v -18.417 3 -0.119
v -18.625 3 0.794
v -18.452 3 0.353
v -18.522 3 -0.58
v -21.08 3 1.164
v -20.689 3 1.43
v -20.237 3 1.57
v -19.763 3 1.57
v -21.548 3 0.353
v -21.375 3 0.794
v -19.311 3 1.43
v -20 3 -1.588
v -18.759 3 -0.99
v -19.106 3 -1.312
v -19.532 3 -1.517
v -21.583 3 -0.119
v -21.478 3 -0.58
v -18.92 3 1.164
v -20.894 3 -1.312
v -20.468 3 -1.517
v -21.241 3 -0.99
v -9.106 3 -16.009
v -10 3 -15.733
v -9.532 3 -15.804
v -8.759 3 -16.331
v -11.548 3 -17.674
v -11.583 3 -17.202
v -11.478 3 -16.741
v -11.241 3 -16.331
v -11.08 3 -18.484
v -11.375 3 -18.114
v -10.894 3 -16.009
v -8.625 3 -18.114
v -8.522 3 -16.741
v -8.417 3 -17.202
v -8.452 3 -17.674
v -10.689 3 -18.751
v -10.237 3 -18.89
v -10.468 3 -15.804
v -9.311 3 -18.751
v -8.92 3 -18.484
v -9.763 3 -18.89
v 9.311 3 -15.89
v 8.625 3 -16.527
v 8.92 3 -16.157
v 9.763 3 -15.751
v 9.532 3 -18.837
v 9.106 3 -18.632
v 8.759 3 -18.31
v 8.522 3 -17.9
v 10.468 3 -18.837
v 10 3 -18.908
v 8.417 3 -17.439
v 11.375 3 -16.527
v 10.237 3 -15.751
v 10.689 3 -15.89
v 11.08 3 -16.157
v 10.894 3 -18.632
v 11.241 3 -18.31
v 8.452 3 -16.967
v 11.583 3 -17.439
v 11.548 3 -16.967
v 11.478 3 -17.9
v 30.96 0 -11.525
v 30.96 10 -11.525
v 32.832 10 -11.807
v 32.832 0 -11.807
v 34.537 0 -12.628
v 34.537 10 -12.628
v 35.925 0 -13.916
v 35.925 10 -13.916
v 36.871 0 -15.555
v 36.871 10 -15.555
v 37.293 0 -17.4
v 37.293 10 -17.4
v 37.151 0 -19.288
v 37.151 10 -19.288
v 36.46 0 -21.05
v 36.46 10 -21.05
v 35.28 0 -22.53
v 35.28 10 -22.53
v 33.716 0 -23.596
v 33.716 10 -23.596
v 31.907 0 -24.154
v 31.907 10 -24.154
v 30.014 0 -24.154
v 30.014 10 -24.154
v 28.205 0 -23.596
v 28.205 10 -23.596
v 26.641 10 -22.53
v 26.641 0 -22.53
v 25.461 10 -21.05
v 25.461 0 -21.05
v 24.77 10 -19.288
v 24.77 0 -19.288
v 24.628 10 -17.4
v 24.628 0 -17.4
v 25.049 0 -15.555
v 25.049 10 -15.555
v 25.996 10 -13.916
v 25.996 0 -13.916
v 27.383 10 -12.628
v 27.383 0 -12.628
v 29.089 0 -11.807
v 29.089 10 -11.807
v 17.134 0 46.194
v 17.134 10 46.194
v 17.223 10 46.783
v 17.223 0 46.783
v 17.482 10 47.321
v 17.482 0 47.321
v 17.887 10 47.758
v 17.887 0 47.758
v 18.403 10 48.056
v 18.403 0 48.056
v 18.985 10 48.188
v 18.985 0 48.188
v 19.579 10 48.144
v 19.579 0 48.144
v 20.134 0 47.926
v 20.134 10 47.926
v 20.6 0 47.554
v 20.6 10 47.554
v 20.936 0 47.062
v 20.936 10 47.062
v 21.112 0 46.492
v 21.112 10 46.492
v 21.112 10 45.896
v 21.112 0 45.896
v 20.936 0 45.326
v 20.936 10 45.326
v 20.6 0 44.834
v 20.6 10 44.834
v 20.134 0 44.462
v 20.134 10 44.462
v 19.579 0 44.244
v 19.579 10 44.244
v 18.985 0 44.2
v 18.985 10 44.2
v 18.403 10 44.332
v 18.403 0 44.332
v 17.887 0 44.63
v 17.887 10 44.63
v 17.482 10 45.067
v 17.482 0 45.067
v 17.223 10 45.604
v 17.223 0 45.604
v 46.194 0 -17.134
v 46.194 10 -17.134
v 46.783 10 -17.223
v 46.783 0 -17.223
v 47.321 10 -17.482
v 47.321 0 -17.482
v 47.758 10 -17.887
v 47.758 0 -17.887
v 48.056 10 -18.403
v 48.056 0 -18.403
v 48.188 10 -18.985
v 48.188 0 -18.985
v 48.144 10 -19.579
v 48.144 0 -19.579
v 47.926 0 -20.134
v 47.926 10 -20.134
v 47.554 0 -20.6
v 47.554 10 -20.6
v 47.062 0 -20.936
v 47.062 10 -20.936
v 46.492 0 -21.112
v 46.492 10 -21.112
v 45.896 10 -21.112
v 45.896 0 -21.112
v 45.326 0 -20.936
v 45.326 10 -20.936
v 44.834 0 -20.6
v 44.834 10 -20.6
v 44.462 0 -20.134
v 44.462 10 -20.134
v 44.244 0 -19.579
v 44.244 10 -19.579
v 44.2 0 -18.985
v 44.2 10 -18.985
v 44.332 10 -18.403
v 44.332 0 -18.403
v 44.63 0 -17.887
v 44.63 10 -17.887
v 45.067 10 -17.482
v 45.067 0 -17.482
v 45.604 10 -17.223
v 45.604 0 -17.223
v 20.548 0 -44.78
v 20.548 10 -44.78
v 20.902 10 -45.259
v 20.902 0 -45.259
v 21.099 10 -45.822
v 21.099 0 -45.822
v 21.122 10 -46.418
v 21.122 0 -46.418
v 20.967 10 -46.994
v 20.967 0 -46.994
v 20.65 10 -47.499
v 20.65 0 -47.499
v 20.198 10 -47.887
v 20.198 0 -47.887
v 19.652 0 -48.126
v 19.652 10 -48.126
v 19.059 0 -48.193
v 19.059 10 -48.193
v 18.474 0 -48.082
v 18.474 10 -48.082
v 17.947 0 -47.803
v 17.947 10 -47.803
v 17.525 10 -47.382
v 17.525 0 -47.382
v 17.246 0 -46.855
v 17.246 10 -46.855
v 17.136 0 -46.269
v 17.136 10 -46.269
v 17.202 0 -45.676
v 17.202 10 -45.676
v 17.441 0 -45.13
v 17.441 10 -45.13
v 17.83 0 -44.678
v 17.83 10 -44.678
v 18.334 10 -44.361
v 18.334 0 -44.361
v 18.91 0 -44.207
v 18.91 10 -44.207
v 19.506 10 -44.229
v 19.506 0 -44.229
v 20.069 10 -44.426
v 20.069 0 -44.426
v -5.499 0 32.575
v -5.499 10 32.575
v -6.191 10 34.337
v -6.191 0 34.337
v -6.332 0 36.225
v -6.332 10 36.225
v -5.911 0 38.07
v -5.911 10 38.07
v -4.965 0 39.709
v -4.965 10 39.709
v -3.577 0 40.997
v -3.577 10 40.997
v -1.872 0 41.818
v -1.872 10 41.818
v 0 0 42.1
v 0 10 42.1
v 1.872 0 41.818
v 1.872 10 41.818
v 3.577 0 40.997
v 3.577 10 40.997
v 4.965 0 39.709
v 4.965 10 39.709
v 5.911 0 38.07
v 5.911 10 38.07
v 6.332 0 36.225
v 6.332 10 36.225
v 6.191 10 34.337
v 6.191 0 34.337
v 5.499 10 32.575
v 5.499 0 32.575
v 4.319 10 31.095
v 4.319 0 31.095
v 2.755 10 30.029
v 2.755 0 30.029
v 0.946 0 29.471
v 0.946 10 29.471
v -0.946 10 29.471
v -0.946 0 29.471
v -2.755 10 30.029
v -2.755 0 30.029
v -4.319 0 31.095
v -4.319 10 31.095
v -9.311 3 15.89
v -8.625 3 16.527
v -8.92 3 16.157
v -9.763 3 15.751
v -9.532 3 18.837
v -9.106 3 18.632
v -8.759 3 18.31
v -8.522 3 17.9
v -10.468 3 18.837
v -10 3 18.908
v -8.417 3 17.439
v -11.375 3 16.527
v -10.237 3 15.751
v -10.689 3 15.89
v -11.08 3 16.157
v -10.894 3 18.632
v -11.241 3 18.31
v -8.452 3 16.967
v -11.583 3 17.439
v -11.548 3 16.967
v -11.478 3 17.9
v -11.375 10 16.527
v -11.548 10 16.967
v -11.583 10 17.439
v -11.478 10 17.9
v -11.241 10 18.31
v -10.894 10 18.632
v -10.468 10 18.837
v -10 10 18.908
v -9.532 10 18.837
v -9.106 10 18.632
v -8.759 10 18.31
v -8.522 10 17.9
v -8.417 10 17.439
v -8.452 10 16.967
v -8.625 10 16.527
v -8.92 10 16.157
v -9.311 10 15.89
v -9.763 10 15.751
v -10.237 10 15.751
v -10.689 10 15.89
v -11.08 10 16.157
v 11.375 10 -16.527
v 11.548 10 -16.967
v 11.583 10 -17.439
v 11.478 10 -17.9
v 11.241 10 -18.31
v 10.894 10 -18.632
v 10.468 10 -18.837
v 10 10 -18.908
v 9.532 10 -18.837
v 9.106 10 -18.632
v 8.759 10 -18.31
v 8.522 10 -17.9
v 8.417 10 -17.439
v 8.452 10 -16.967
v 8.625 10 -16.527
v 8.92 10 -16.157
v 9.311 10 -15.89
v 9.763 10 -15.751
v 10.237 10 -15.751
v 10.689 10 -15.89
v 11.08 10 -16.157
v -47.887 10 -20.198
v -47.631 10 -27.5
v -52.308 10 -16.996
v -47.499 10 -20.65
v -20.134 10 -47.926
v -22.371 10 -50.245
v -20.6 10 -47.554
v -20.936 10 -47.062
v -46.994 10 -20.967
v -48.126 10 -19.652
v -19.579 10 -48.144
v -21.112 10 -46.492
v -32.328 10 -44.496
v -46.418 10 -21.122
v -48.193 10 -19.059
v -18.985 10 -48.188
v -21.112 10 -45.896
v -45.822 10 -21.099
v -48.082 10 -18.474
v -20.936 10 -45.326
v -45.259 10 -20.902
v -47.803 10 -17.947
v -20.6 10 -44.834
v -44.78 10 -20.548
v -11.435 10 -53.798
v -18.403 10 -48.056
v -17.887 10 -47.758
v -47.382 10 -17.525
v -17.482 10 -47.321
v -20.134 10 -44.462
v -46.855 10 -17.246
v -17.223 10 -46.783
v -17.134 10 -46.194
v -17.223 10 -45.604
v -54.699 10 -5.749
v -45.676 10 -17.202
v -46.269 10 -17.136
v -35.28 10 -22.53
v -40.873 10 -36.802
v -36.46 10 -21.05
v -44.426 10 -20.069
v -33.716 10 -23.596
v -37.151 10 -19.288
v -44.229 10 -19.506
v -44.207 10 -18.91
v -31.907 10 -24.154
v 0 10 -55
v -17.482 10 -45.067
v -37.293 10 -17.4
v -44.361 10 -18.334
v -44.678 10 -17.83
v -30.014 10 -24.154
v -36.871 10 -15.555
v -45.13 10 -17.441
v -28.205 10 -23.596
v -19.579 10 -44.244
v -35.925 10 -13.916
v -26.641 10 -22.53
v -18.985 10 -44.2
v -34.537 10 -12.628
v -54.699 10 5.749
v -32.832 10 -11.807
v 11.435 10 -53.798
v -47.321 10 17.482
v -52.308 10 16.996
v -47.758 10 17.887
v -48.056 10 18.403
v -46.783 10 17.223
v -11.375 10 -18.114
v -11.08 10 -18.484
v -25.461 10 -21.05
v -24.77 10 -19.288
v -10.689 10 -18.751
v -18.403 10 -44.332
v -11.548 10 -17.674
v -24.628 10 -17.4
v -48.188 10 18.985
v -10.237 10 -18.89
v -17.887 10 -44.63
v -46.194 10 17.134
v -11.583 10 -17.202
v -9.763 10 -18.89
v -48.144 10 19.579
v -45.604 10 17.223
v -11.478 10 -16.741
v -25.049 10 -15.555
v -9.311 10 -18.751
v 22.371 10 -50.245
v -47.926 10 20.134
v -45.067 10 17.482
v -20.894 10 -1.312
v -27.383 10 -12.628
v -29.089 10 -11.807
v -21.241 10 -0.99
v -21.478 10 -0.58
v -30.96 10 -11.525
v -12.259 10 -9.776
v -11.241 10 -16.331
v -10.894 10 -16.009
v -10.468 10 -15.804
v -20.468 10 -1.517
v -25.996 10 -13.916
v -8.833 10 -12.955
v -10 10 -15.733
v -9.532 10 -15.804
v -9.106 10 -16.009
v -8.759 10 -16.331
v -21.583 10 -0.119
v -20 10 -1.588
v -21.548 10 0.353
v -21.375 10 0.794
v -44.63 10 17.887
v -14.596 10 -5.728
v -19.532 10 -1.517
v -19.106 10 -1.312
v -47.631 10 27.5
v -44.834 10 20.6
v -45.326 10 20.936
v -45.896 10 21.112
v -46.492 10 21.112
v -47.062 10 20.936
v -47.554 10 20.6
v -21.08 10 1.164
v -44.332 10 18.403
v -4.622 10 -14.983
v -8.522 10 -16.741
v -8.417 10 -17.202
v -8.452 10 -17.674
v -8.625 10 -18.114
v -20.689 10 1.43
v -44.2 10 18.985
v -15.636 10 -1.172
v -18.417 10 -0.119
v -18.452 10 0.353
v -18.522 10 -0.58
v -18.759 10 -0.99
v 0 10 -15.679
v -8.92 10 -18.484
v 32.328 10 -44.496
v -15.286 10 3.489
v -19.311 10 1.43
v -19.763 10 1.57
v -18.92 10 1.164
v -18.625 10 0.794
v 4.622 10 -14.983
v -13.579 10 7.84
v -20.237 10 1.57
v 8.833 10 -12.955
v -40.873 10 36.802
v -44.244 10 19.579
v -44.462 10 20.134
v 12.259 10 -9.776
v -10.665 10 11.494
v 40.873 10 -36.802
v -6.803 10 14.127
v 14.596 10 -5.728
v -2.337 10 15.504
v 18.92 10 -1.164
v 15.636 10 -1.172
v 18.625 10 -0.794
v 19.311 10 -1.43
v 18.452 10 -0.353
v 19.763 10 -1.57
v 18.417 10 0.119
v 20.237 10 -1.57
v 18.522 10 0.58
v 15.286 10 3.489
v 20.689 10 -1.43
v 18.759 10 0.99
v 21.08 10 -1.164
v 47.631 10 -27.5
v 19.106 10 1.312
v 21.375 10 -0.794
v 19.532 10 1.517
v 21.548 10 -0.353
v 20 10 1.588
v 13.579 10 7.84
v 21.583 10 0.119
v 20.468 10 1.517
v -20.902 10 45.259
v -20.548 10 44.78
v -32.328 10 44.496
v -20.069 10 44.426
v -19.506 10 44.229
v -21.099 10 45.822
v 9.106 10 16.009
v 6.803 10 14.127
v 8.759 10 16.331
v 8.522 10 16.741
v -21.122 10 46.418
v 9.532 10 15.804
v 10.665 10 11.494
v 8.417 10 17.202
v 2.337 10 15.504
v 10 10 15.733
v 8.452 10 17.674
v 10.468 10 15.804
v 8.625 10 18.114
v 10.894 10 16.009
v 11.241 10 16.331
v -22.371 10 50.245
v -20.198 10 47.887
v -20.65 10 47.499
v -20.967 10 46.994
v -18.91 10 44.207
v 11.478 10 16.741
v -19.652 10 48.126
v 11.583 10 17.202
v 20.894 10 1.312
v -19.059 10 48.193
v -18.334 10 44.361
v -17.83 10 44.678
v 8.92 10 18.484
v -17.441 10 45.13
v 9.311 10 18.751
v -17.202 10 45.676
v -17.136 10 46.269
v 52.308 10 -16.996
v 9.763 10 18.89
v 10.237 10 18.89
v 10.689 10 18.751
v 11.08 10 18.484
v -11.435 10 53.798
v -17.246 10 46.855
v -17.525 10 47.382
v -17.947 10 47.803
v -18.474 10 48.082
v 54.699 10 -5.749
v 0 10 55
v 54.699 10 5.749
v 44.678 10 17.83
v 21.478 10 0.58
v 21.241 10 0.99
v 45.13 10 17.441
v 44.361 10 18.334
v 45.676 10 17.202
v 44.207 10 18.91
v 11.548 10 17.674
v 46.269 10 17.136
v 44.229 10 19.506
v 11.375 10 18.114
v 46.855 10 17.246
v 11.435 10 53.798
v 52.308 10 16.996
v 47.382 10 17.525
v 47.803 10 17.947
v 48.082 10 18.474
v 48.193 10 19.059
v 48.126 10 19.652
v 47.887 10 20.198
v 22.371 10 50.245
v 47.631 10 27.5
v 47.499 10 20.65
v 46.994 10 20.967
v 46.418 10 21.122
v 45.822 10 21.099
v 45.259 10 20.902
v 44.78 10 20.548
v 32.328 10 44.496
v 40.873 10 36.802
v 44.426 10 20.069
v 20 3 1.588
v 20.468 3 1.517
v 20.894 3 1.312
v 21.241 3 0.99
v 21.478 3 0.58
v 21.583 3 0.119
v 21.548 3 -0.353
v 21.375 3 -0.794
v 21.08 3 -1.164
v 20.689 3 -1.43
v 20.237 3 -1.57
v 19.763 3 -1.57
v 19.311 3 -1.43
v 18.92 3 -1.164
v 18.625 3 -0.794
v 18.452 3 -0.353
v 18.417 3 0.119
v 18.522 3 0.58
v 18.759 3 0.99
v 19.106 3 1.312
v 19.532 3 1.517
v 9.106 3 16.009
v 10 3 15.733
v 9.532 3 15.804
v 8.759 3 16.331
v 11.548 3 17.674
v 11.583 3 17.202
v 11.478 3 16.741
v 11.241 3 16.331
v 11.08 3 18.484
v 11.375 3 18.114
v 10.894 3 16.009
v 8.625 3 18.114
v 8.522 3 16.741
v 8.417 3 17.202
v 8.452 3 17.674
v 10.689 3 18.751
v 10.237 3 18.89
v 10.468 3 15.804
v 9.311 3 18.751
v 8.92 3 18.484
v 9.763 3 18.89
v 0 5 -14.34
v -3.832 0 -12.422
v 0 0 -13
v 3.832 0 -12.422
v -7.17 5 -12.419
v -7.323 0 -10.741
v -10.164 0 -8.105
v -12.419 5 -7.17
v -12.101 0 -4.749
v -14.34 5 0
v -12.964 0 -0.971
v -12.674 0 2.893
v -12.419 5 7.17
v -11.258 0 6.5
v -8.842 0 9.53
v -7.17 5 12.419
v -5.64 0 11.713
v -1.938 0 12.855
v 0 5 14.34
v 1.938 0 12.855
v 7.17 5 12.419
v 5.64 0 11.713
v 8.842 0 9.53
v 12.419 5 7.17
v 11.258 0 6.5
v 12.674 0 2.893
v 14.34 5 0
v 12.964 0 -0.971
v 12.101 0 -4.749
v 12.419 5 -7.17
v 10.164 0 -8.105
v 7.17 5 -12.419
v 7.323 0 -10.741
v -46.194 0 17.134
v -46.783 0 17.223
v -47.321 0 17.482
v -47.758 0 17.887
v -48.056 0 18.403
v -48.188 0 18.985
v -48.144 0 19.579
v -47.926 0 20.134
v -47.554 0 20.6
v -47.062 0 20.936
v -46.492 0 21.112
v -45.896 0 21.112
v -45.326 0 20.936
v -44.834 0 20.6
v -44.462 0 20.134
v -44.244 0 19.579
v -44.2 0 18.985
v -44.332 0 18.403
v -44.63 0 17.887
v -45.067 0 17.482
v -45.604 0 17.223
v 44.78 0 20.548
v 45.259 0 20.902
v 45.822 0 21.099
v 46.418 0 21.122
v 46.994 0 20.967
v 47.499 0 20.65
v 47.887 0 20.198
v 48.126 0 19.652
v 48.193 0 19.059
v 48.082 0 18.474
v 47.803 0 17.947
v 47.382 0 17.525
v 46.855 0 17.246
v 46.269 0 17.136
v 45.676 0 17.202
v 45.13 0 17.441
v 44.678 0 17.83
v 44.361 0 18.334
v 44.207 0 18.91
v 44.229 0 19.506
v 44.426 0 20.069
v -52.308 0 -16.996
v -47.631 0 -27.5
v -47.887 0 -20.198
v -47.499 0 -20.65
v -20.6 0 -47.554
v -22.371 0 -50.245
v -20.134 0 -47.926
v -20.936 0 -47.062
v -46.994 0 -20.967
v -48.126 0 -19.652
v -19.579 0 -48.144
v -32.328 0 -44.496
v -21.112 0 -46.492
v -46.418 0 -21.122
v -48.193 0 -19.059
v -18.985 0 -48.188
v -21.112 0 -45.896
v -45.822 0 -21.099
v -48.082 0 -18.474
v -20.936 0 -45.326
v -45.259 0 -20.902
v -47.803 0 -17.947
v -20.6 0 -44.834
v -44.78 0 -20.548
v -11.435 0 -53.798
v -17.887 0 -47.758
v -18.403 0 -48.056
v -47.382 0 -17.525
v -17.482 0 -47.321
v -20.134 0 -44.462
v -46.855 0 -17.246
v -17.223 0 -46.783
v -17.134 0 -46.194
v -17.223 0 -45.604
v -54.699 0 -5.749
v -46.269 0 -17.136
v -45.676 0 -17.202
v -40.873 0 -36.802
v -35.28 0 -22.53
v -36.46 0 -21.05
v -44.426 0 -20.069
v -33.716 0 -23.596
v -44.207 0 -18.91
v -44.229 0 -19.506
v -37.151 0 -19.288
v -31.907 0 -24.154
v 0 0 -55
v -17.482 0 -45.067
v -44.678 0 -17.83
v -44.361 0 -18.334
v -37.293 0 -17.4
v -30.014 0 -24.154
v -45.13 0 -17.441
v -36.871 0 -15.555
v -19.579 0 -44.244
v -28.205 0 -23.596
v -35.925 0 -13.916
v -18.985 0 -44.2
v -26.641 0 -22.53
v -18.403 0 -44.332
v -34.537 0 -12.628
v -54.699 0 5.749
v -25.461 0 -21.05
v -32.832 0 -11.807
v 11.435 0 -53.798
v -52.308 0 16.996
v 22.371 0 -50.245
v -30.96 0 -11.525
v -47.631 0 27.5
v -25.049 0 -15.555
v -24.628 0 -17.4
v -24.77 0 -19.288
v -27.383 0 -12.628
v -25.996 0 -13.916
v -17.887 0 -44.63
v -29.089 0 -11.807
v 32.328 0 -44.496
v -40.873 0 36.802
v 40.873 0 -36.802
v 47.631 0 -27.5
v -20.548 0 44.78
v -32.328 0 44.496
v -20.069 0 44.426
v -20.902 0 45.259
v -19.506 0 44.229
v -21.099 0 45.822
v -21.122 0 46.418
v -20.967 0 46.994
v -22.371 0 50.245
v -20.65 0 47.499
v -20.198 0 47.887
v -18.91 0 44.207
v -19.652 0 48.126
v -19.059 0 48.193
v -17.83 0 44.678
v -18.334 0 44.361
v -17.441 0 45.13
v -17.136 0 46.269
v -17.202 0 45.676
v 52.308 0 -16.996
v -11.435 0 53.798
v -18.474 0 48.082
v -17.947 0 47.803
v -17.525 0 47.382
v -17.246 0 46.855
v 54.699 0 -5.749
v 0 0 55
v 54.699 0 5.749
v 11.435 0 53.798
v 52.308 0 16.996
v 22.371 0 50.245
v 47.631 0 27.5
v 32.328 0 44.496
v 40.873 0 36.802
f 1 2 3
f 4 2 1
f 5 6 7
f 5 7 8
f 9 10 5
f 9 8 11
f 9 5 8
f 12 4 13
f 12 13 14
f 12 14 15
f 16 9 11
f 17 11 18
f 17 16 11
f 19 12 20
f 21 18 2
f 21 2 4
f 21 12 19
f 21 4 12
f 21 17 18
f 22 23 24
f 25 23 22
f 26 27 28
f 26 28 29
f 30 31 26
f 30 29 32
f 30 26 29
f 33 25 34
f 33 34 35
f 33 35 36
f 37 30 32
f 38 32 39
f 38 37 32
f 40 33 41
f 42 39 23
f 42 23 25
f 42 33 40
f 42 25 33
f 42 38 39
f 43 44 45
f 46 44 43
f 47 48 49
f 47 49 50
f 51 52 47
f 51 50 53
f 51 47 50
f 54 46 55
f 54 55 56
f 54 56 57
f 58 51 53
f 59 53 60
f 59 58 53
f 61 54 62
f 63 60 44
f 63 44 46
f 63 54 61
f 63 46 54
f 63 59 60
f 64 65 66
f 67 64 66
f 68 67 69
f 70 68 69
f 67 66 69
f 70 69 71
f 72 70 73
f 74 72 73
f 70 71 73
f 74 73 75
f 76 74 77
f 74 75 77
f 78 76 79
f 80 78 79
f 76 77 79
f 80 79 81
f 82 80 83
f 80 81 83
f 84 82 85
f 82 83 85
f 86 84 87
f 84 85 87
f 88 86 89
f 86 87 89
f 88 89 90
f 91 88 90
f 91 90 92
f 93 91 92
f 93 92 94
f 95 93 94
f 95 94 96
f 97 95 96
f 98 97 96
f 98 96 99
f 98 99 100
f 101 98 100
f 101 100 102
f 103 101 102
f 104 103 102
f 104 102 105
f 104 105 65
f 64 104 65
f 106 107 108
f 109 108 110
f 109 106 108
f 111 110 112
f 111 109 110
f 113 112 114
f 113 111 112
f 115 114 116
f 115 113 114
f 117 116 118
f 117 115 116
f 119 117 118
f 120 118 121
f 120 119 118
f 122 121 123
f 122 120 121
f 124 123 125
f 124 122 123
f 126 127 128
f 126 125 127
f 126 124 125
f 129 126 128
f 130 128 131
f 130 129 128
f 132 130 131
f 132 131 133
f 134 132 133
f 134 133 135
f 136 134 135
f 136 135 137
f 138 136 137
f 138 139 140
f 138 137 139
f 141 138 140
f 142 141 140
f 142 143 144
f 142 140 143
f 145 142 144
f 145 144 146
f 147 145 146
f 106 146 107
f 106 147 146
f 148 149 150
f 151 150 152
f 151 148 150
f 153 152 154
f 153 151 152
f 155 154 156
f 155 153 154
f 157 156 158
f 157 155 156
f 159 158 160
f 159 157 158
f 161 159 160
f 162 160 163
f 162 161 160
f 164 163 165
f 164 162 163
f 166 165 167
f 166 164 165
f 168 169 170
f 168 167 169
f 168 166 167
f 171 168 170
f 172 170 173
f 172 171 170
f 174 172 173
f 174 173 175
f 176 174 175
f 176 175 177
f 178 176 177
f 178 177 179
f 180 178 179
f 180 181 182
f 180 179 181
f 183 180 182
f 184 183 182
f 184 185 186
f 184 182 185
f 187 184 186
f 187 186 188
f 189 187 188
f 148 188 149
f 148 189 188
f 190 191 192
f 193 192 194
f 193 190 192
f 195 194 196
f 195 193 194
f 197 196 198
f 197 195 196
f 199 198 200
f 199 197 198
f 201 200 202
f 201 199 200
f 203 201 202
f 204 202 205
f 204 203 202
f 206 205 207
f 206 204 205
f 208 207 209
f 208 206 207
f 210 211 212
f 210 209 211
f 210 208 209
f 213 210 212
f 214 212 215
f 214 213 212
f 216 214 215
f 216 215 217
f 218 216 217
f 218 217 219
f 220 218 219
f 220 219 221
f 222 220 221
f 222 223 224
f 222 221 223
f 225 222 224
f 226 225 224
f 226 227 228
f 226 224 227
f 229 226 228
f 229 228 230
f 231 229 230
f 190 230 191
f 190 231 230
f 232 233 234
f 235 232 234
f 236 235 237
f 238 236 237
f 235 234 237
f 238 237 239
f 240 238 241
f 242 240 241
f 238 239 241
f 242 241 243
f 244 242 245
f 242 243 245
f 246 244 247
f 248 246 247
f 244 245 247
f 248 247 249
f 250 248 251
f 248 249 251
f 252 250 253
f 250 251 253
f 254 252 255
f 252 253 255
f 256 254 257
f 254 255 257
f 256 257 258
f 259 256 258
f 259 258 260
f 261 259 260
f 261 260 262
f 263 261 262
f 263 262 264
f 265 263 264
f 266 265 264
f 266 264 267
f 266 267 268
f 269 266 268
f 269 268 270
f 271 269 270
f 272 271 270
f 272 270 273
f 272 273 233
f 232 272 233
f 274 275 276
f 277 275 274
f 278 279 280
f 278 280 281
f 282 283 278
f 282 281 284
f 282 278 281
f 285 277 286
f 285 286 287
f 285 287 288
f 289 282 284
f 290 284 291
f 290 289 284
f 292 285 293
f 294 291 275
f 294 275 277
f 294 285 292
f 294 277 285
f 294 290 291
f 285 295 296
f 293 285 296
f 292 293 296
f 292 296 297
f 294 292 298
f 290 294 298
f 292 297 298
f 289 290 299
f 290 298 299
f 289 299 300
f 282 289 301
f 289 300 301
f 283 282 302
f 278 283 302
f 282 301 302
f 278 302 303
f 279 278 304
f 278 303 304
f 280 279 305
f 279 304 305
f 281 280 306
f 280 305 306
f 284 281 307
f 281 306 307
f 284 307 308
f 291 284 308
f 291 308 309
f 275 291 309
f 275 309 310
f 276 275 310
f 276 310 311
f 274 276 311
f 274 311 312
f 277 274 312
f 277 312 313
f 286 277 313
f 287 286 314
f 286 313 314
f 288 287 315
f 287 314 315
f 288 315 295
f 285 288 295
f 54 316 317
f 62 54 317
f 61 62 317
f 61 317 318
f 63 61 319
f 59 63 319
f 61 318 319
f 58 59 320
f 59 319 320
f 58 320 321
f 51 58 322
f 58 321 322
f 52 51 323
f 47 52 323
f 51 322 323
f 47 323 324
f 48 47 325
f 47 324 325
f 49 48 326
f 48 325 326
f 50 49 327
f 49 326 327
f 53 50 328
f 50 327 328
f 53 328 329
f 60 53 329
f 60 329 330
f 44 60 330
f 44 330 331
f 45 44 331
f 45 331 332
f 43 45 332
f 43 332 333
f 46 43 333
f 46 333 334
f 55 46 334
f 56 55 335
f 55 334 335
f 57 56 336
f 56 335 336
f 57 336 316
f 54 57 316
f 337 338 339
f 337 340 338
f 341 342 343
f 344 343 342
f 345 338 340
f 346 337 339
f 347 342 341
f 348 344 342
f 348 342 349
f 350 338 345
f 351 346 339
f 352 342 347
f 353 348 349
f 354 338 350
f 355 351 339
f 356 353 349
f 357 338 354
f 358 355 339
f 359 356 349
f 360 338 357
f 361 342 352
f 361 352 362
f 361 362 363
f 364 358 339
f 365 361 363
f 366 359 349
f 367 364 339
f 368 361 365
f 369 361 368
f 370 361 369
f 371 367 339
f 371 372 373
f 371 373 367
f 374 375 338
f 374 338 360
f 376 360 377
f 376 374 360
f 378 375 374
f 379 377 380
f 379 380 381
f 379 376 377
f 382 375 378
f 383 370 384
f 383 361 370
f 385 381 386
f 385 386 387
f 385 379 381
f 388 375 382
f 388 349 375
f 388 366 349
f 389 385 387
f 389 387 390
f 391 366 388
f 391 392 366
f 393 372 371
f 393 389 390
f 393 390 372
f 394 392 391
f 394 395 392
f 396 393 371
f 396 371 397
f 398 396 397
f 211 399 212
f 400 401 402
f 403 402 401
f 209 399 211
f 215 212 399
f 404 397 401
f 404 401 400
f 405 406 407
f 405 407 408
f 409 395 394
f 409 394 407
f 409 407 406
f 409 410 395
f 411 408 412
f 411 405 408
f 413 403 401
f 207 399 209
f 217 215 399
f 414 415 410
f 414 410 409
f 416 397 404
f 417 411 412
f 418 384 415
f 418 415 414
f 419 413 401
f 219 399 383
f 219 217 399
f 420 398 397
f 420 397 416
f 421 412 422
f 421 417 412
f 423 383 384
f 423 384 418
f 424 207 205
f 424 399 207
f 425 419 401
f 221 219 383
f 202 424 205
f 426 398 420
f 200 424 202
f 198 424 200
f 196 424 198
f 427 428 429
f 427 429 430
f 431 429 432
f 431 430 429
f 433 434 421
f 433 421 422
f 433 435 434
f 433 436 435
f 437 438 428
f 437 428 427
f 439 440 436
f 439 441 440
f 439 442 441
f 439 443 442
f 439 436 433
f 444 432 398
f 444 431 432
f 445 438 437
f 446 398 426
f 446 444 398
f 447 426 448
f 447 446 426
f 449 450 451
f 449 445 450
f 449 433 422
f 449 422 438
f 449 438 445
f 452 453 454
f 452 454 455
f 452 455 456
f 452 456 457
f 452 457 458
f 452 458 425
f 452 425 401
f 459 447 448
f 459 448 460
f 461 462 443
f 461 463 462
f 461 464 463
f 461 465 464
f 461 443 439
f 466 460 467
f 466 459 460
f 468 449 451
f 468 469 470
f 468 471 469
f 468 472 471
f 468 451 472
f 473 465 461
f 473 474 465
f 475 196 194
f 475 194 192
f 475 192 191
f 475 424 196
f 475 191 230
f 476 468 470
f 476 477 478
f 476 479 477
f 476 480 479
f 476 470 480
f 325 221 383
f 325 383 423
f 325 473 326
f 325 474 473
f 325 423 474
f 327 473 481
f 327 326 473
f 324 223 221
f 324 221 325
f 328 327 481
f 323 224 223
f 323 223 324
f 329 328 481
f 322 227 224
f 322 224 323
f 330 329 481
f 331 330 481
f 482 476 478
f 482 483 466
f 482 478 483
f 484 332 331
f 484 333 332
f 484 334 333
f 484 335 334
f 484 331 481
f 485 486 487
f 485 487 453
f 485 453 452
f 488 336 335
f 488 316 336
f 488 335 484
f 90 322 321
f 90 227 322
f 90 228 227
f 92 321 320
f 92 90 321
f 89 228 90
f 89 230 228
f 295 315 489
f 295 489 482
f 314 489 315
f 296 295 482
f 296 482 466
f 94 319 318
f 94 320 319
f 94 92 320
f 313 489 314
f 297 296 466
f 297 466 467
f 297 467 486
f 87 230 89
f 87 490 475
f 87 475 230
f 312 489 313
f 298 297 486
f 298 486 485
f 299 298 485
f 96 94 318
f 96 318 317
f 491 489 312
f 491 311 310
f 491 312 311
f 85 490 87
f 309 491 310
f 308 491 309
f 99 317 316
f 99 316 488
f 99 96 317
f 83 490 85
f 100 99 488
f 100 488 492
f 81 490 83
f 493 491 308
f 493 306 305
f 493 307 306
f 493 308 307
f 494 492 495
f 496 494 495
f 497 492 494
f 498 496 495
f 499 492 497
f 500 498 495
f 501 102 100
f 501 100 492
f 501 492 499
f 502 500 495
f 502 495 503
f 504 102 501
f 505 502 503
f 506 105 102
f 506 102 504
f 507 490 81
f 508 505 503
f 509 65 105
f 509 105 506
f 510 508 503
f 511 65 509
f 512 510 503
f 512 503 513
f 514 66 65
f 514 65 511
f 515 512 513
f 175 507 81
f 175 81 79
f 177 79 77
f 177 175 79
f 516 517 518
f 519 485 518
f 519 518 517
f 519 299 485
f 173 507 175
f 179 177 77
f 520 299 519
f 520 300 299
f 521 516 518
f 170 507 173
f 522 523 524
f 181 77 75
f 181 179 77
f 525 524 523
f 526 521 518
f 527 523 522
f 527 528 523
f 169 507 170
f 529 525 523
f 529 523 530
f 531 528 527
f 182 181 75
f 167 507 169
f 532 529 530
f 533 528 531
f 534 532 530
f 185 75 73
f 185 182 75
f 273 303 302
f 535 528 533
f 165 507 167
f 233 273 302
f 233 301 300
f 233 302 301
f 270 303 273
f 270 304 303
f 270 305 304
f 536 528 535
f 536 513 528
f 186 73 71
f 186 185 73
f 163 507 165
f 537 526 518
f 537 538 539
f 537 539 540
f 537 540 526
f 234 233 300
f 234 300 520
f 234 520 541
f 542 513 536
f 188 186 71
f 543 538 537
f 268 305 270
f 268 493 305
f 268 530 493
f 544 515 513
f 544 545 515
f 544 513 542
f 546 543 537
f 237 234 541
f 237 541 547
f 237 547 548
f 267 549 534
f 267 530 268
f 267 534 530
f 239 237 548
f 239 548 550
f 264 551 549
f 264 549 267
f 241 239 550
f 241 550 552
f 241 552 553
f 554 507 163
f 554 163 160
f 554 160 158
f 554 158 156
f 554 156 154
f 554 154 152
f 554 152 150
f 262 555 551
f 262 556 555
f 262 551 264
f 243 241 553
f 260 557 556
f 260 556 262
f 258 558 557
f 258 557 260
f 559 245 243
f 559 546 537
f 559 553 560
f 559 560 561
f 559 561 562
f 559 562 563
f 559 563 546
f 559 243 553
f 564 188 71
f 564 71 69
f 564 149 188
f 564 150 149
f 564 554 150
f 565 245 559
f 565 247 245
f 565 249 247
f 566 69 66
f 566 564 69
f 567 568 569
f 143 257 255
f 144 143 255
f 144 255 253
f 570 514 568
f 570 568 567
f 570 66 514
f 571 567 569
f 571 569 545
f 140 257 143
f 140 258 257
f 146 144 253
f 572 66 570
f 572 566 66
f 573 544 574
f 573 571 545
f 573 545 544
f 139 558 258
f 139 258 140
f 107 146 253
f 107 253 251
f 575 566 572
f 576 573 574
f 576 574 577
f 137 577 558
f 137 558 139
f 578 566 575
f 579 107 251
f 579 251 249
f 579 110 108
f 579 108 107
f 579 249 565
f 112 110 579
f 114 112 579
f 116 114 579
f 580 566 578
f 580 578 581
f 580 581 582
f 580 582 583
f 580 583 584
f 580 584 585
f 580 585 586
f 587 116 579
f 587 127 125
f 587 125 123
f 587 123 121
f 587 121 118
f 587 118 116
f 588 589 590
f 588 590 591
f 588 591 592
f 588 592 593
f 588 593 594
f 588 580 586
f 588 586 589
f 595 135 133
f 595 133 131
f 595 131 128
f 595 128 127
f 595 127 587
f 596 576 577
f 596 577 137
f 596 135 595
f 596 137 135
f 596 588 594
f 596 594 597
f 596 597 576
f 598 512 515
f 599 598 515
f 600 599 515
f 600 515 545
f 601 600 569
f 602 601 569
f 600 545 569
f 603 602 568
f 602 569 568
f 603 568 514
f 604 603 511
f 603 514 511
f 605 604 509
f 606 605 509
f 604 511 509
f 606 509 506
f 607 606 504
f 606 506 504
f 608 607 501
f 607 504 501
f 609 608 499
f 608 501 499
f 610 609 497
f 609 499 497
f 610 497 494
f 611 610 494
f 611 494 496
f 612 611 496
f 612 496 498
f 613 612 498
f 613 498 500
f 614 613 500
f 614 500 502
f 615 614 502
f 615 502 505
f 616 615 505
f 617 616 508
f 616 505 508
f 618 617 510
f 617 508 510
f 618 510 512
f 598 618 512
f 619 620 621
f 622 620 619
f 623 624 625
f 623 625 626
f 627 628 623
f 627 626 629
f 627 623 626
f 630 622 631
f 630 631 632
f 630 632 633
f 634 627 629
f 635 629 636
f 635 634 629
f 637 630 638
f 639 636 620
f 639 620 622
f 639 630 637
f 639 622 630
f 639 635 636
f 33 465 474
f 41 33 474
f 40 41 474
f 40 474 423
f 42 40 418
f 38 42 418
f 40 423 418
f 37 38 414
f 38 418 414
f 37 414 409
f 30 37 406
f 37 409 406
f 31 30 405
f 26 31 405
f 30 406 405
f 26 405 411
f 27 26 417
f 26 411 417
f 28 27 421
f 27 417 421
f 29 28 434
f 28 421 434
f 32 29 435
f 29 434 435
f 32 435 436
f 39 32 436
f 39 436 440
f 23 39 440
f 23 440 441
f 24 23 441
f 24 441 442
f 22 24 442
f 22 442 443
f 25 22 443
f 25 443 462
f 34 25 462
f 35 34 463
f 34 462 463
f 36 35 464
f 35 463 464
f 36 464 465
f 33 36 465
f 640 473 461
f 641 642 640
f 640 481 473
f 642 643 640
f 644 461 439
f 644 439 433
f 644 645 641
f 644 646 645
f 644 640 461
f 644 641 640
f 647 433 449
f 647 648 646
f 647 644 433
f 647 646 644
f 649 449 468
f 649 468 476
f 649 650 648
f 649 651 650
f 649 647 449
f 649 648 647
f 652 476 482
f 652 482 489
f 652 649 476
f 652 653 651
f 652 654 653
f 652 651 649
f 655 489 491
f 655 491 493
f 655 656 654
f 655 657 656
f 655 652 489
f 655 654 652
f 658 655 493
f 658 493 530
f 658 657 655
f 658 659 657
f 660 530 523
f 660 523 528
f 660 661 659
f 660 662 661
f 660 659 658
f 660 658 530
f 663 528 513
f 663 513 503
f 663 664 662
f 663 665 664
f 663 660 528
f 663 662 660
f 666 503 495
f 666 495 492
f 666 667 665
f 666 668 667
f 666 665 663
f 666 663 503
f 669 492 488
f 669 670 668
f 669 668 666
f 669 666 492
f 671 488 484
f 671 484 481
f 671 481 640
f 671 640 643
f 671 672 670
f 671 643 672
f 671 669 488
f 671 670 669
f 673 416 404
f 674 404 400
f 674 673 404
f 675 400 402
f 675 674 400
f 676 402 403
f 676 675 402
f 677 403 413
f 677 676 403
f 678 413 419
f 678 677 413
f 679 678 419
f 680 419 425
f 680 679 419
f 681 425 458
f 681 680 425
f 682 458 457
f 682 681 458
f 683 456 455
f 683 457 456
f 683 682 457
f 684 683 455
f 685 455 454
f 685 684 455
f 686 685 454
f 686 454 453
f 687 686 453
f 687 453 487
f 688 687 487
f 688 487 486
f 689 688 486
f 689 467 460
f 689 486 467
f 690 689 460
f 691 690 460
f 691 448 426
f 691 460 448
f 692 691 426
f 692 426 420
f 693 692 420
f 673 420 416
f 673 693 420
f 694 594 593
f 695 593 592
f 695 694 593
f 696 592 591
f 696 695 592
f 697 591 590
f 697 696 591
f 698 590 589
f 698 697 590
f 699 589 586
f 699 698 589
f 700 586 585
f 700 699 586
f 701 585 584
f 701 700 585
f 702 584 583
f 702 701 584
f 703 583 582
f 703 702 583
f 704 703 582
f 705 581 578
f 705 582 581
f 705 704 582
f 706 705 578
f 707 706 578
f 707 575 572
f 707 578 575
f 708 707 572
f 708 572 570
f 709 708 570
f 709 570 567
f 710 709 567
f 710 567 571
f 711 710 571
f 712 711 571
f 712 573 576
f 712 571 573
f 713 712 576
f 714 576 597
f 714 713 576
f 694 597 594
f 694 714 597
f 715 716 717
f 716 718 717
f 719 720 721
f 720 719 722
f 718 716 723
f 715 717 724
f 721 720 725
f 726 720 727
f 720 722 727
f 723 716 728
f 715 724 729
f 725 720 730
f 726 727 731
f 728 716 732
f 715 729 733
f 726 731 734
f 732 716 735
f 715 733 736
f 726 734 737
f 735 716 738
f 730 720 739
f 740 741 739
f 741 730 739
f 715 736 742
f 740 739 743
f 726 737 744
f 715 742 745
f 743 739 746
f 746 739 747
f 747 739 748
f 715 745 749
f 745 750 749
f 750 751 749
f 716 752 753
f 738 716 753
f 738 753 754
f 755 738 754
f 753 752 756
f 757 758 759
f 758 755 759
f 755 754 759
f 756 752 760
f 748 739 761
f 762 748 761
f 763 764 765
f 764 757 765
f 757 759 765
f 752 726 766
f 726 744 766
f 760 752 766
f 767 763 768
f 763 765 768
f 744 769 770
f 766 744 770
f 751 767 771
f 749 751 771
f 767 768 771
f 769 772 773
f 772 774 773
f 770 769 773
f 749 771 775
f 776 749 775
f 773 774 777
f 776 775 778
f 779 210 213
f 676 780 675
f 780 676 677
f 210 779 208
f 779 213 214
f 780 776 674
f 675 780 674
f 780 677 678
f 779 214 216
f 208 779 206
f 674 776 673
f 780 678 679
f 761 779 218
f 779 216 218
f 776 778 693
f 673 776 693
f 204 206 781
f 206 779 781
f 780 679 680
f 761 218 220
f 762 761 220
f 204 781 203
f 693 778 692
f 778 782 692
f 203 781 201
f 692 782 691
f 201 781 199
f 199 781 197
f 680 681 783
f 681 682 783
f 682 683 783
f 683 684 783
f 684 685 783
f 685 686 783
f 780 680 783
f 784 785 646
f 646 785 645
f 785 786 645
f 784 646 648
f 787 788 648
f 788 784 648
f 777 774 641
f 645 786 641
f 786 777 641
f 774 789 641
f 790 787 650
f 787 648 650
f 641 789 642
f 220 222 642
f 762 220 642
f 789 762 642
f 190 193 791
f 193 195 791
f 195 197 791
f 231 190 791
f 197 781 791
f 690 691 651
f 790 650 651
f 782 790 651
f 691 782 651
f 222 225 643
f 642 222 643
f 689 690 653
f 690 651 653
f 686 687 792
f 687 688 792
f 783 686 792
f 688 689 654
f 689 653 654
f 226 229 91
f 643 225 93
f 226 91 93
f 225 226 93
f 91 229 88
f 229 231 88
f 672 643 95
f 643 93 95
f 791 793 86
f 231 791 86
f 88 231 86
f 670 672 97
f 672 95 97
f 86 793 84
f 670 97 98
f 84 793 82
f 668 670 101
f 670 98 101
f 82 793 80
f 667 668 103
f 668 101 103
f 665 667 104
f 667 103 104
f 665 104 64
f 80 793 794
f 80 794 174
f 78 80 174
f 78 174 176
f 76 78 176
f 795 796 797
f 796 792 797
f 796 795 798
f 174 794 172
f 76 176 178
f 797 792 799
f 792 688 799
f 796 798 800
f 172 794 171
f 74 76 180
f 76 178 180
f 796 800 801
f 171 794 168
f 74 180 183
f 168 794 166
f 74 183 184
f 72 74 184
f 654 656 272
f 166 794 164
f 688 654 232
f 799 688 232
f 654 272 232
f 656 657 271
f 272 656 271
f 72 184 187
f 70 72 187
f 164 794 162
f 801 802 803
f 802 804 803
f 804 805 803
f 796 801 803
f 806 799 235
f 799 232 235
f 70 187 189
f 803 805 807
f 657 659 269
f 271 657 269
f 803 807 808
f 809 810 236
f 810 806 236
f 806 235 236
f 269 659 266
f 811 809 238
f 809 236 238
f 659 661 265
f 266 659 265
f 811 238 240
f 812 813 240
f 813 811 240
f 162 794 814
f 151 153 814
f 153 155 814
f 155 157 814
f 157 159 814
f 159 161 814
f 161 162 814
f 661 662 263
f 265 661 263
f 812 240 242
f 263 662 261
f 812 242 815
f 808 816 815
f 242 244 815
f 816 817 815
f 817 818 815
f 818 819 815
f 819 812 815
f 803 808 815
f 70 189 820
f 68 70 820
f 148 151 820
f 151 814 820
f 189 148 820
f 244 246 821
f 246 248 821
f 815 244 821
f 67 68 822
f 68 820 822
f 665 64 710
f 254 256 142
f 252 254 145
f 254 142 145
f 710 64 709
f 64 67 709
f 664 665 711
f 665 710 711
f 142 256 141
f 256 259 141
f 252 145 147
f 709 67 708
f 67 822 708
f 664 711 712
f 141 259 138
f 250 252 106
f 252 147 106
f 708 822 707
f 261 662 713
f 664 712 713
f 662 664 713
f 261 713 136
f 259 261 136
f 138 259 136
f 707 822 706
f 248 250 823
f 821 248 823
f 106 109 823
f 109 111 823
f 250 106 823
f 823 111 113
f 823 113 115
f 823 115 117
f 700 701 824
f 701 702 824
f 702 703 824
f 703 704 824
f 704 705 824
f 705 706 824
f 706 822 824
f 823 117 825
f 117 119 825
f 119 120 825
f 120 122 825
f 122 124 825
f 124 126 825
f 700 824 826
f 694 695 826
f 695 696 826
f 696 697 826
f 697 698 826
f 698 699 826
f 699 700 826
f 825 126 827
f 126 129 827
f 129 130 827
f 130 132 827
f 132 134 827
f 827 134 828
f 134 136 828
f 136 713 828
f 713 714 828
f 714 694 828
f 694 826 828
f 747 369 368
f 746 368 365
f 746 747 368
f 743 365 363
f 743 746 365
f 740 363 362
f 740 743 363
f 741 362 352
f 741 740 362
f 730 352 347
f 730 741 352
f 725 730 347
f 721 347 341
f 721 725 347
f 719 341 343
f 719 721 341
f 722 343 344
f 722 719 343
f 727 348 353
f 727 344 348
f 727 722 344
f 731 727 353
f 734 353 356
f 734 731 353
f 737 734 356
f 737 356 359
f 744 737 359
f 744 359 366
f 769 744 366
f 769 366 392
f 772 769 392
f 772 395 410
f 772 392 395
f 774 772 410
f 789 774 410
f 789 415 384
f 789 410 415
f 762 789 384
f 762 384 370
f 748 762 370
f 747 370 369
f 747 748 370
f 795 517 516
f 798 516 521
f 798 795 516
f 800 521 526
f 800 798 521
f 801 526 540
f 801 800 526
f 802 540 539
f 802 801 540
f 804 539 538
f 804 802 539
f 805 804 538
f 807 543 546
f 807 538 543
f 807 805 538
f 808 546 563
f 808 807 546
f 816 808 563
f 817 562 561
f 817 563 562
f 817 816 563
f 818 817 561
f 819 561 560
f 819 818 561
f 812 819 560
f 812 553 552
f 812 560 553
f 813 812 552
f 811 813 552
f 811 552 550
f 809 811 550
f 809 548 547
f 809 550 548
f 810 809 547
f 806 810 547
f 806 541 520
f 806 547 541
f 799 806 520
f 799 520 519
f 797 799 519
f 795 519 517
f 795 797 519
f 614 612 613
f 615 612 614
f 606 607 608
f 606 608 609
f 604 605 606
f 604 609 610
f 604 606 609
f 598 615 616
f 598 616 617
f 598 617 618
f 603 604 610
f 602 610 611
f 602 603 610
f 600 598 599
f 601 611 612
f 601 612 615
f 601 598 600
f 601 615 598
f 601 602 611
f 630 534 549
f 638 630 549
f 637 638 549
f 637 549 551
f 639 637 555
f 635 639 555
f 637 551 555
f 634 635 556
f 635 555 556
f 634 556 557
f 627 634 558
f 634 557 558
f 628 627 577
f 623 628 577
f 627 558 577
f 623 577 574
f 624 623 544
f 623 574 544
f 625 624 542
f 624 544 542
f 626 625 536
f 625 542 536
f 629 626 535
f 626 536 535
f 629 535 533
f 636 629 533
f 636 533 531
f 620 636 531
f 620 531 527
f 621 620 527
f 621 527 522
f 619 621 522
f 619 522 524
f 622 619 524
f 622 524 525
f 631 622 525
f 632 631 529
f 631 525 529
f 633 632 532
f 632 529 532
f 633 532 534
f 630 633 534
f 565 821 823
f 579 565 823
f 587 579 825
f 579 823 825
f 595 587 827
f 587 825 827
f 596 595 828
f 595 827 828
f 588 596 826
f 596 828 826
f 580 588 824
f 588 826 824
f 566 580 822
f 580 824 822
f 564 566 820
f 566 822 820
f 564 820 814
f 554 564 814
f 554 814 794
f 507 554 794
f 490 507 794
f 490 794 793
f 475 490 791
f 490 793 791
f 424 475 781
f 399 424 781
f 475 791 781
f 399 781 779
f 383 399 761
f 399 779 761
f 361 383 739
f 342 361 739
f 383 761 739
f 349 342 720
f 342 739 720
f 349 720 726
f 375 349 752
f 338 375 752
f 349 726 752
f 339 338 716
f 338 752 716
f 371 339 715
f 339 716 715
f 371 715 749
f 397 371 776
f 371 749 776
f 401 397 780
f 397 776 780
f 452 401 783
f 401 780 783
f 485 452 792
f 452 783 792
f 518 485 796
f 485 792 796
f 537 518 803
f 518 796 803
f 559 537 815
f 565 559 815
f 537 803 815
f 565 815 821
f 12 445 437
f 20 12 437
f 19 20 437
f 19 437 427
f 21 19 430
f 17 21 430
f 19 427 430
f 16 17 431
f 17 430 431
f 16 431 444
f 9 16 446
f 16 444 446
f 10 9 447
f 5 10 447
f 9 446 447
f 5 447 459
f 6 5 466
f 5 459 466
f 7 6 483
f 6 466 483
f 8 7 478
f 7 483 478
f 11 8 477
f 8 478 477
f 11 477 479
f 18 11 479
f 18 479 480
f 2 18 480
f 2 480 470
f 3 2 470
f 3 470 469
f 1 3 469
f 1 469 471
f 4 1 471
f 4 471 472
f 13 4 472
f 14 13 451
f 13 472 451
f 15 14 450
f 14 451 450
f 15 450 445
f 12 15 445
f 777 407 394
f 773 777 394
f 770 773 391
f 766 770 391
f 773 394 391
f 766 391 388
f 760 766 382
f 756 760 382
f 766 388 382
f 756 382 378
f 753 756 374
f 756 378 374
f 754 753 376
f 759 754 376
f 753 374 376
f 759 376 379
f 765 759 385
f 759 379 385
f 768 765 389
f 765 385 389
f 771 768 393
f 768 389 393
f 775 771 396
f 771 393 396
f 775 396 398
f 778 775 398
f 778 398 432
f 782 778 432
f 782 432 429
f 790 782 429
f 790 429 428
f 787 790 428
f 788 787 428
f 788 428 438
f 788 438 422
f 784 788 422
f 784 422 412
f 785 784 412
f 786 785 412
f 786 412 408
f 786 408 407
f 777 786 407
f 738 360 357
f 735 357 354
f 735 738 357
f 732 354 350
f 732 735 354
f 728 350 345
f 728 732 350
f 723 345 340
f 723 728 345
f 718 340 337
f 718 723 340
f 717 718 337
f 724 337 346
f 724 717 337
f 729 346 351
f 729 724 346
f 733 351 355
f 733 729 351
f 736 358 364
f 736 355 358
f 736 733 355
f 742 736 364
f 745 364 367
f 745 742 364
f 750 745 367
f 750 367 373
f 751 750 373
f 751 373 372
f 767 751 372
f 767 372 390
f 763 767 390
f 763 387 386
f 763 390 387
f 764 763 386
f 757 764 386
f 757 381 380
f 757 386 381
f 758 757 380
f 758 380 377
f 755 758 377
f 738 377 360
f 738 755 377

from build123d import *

# Parameters (mm, degrees)
SKETCH1_R           = 55
BOSS_EXTRUDE1_DEPTH = 10
SKETCH6_R           = 2
CUT_EXTRUDE3_DEPTH  = 79.421935707
CIRPATTERN1_COUNT   = 8
SKETCH7_R           = 6.35
CUT_EXTRUDE4_DEPTH  = 79.421935707
CIRPATTERN2_COUNT   = 3
SKETCH8_R           = 1.5875
CUT_EXTRUDE5_DEPTH  = 7
CIRPATTERN3_COUNT   = 6


with BuildPart() as part:
    # Sketch1 → Boss-Extrude1 (new body)
    with BuildSketch(Plane(origin=(0, 0, 0), x_dir=(1, 0, 0), z_dir=(0, 1, 0))):
        with Locations(Location((0, 0, 0), (0, 0, 270))):
            Circle(SKETCH1_R)
    extrude(amount=BOSS_EXTRUDE1_DEPTH)

    # Sketch5 → Cut-Revolve1 (revolve, cut)
    with BuildSketch(Plane.XY, mode=Mode.PRIVATE) as cut_revolve1_sk:
        Polygon((0, 0), (0, 10), (15.679491924, 10), (13, 0), align=None)
    revolve(cut_revolve1_sk.sketch.rotate(Axis((0, 0, 0), (0, 1, 0)), 90), axis=Axis((0, 0, 0), (0, 1, 0)), mode=Mode.SUBTRACT)

    # Sketch6 → Cut-Extrude3 (cut, through all)
    with BuildSketch(Plane(origin=(0, 0, 0), x_dir=(1, 0, 0), z_dir=(0, 1, 0))):
        with Locations(Location((46.193976626, 19.134171618, 0), (0, 0, 270))):
            Circle(SKETCH6_R)
    cut_extrude3 = extrude(amount=CUT_EXTRUDE3_DEPTH, mode=Mode.SUBTRACT)

    # CirPattern1: Cut-Extrude3 ×8 about axis
    cirpattern1_axis = Axis((0, 0, 0), (0, 1, 0))
    for i in range(1, CIRPATTERN1_COUNT):
        add(cut_extrude3.rotate(cirpattern1_axis, i * 360 / CIRPATTERN1_COUNT), mode=Mode.SUBTRACT)

    # Sketch7 → Cut-Extrude4 (cut, through all)
    with BuildSketch(Plane(origin=(0, 10, 0), x_dir=(1, 0, 0), z_dir=(0, 1, 0))):
        with Locations(Location((30.960408185, 17.875, 0), (0, 0, 270))):
            Circle(SKETCH7_R)
    cut_extrude4 = extrude(amount=-CUT_EXTRUDE4_DEPTH, mode=Mode.SUBTRACT)

    # CirPattern2: Cut-Extrude4 ×3 about axis
    cirpattern2_axis = Axis((0, 0, 0), (0, 1, 0))
    for i in range(1, CIRPATTERN2_COUNT):
        add(cut_extrude4.rotate(cirpattern2_axis, i * 360 / CIRPATTERN2_COUNT), mode=Mode.SUBTRACT)

    # Sketch8 → Cut-Extrude5 (cut)
    with BuildSketch(Plane(origin=(0, 10, 0), x_dir=(1, 0, 0), z_dir=(0, 1, 0))):
        with Locations(Location((20, 0, 0), (0, 0, 270))):
            Circle(SKETCH8_R)
    cut_extrude5 = extrude(amount=-CUT_EXTRUDE5_DEPTH, mode=Mode.SUBTRACT)

    # CirPattern3: Cut-Extrude5 ×6 about axis
    cirpattern3_axis = Axis((0, 0, 0), (0, 1, 0))
    for i in range(1, CIRPATTERN3_COUNT):
        add(cut_extrude5.rotate(cirpattern3_axis, i * 360 / CIRPATTERN3_COUNT), mode=Mode.SUBTRACT)


solid = part.part
